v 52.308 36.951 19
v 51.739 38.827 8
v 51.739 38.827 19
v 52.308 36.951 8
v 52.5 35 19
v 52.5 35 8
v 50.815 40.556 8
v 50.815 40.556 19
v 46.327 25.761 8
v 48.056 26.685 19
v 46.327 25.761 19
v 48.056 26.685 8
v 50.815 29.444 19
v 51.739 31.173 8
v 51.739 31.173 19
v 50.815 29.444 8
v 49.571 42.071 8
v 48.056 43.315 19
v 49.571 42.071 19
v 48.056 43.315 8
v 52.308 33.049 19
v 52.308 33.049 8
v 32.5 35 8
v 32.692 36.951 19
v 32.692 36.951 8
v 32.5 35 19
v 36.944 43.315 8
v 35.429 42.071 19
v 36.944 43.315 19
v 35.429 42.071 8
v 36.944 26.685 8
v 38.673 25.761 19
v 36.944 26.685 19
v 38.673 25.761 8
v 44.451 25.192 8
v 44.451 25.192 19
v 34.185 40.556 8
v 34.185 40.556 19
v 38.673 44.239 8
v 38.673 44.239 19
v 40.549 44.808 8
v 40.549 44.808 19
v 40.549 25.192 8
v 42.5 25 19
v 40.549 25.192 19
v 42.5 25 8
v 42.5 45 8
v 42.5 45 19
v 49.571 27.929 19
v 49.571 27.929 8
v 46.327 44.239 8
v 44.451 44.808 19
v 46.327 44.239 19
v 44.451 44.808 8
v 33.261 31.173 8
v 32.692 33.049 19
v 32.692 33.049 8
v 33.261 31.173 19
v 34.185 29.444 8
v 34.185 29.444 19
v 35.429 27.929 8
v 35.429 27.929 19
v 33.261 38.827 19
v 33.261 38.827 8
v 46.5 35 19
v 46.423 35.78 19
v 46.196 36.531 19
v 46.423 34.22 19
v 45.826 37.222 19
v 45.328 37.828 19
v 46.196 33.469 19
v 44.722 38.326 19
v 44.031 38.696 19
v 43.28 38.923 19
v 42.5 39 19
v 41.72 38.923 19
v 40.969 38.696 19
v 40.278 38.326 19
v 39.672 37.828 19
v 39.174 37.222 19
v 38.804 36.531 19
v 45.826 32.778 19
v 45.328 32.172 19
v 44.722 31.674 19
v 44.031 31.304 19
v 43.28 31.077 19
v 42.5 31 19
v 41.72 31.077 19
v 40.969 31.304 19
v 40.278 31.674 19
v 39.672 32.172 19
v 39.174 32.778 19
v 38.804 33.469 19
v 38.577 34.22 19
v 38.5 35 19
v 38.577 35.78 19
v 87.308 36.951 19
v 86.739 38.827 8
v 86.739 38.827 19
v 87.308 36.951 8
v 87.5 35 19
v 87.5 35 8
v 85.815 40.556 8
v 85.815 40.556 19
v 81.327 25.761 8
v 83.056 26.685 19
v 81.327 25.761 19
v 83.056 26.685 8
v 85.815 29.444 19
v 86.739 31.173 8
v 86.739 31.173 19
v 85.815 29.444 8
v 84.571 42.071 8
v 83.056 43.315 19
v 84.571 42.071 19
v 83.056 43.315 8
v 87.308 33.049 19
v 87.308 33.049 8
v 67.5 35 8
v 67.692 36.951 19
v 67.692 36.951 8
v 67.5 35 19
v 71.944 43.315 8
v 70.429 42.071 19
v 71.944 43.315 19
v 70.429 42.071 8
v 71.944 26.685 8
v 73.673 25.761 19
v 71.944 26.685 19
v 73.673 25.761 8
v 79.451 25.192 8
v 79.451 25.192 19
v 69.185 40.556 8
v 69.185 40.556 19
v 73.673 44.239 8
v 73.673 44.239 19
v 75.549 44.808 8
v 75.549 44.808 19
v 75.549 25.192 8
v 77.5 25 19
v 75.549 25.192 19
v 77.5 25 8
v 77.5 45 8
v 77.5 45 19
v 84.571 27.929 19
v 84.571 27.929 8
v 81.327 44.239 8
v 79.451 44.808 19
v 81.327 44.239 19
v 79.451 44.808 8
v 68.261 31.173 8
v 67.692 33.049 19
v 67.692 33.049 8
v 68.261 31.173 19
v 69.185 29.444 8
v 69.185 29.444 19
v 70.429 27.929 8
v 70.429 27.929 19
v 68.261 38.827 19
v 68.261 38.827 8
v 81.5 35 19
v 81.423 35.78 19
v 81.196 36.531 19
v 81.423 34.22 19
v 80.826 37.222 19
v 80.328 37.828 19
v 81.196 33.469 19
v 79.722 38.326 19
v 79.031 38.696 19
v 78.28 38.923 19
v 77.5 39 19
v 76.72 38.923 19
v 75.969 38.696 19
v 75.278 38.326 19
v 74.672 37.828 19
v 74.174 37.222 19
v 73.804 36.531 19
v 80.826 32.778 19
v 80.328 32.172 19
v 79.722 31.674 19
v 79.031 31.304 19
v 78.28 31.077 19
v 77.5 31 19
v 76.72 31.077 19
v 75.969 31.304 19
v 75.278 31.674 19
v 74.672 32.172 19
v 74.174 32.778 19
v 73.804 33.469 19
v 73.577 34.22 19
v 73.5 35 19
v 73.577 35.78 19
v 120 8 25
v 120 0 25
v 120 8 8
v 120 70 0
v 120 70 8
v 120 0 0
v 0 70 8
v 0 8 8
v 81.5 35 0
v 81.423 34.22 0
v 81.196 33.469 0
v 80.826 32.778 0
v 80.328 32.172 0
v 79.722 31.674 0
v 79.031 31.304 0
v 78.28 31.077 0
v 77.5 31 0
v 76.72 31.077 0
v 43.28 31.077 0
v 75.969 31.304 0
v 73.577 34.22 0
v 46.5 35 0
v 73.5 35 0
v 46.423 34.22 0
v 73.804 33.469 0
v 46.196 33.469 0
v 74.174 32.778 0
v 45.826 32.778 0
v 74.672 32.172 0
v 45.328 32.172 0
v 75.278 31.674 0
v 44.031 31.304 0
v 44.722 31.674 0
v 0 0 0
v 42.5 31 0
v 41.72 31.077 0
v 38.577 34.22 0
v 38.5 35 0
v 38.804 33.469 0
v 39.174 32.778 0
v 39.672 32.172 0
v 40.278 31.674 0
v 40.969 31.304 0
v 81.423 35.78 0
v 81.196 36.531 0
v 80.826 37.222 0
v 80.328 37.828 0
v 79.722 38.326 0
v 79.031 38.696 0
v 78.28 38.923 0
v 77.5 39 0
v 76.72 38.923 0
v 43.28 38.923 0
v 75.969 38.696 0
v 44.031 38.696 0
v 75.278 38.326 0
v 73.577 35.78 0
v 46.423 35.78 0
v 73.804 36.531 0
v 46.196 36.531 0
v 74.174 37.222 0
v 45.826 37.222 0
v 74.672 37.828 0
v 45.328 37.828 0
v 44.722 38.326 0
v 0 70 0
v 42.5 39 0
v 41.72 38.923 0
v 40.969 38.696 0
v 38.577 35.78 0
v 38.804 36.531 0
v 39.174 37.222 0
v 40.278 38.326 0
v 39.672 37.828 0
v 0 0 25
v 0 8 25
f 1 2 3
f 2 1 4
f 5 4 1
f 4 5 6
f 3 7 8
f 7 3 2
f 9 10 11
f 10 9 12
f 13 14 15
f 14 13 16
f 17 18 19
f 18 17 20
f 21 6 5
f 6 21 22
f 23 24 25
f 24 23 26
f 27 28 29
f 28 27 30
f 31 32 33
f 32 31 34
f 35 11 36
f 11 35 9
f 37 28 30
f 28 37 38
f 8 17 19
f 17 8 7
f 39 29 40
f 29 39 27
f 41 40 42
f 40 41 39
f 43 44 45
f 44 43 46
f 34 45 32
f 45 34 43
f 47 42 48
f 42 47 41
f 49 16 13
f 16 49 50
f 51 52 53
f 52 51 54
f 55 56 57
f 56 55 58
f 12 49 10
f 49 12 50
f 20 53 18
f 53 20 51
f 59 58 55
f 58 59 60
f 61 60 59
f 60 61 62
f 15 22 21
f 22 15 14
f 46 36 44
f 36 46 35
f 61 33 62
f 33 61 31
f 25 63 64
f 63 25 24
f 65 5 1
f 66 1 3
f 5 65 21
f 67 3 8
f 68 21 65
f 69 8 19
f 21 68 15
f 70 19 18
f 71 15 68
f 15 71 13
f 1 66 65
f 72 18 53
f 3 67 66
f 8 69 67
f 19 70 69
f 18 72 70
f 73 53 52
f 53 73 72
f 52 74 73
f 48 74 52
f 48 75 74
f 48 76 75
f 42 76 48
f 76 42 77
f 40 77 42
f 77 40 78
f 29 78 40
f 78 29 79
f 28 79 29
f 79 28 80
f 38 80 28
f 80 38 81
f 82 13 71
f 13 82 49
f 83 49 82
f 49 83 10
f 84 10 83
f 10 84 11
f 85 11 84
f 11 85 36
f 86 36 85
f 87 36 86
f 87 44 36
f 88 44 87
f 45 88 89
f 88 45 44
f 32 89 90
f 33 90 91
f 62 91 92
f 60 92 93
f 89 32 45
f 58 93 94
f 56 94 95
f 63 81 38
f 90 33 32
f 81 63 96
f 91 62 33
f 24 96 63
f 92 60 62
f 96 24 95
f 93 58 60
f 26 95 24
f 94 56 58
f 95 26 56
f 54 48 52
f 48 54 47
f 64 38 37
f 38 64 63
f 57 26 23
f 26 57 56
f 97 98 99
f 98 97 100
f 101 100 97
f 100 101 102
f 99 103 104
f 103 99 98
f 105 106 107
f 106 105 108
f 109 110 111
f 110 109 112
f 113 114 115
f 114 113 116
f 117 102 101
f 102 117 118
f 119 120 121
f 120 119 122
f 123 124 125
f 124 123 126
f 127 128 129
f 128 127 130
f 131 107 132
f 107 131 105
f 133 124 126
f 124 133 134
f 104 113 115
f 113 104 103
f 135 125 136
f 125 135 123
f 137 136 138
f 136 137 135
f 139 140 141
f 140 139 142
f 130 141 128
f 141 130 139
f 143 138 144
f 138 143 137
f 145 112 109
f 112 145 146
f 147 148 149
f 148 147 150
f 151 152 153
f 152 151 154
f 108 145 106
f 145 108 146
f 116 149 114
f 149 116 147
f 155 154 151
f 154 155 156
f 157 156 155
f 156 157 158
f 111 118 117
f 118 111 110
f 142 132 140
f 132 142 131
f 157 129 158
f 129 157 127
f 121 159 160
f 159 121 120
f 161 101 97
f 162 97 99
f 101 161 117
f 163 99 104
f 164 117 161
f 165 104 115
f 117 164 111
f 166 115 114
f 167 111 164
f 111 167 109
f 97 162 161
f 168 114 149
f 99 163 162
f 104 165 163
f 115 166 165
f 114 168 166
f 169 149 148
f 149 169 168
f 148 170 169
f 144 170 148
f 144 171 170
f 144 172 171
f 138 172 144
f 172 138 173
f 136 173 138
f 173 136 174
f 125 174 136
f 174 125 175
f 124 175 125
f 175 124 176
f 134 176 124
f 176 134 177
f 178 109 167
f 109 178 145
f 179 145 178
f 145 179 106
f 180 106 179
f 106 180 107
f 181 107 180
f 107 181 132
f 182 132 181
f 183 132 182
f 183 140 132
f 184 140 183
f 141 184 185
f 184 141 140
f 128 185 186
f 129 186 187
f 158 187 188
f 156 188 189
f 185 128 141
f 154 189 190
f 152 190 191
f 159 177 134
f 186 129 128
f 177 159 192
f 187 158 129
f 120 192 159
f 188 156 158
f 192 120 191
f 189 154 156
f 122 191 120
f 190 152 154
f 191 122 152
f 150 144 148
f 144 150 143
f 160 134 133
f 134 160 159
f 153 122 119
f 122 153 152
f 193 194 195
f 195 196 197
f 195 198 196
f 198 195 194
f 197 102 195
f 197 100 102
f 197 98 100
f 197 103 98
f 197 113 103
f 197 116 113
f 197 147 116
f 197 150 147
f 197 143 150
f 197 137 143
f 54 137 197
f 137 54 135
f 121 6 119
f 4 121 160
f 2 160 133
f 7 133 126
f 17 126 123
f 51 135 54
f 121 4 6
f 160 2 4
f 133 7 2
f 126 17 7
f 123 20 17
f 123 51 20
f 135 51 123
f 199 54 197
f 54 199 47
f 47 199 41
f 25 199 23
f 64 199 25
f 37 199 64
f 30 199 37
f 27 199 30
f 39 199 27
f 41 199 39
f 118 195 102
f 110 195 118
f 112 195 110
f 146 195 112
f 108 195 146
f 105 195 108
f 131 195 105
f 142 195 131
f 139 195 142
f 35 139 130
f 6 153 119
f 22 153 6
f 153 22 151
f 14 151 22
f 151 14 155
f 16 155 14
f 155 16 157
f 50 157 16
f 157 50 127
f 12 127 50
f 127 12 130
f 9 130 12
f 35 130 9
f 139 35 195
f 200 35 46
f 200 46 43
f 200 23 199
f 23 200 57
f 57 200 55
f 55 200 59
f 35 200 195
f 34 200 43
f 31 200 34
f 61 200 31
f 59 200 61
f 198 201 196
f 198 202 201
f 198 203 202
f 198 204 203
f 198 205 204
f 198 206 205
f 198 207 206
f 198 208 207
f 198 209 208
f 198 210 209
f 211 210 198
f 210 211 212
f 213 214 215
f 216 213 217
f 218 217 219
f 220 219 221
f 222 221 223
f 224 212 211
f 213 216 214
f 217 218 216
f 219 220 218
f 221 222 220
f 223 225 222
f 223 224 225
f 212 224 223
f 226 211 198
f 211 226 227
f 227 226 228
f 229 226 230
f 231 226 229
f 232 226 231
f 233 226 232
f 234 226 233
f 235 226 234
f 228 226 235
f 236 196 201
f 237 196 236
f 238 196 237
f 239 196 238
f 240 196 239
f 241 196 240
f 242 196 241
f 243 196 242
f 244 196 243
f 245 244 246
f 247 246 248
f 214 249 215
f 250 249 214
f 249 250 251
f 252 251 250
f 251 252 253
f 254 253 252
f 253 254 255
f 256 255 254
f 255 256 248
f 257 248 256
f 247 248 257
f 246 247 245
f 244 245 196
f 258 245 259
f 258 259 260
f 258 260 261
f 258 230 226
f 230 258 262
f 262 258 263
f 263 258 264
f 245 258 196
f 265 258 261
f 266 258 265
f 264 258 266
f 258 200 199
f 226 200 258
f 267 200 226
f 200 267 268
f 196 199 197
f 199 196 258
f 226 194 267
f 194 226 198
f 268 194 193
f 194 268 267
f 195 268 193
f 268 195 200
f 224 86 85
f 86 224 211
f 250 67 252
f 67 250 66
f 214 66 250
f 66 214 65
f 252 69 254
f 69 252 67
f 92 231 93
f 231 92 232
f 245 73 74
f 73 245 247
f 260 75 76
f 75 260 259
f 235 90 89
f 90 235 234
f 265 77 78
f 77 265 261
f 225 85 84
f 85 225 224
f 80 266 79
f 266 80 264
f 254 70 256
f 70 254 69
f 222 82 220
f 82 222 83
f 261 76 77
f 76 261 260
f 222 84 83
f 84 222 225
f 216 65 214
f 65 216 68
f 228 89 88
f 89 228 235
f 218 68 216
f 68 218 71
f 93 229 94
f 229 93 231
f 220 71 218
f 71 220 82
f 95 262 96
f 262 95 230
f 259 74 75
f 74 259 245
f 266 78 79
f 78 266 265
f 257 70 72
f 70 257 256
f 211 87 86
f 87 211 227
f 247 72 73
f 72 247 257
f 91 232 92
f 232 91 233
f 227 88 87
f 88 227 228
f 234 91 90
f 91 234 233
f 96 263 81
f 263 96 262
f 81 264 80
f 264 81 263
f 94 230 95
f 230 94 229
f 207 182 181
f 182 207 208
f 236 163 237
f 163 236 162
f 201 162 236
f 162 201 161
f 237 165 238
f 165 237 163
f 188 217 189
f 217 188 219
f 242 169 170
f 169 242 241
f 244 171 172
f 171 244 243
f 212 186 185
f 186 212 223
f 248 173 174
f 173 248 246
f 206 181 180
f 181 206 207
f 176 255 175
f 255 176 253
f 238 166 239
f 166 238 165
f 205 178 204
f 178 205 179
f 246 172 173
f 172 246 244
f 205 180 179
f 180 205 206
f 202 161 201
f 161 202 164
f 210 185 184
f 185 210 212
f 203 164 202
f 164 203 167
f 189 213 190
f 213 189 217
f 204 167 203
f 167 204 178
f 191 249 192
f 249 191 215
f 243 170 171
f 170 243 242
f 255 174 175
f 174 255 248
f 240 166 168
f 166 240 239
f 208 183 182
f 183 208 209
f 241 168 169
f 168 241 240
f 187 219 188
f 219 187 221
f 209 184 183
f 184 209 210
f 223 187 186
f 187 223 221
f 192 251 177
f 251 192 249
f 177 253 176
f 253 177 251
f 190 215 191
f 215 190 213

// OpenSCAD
$fn = 32;

// ----------------------------------------------------------------------
// Drill jig: fence jig
// ----------------------------------------------------------------------

// --- parameters (mm) ---
plate_l = 120;            // plate length, X
plate_w = 70;             // plate width, Y
plate_t = 8;              // plate thickness
boss_d = 20;              // guide boss diameter
boss_h = 12;              // boss height above the plate
guide_d = 8;              // guide hole diameter
boss_pitch = 35;          // boss pitch
fence_h = 18;             // fence height above the plate
fence_t = 8;              // fence thickness

n_boss = 2;  // guide bosses
boss_x0 = (plate_l - (n_boss - 1) * boss_pitch) / 2;  // first boss X
boss_top = plate_t - 1 + boss_h;  // boss crown height
fence_top = plate_t - 1 + fence_h;  // fence crown height
total_h = max([fence_top, boss_top]);  // overall height

difference() {
  union() {
  cube([plate_l, plate_w, plate_t]);
  for (i = [0 : n_boss - 1])
    translate([boss_x0 + i * boss_pitch, plate_w / 2, plate_t - 1])
      cylinder(h = boss_h, d = boss_d);
  translate([0, 0, plate_t - 1]) cube([plate_l, fence_t, fence_h]);
  }
  for (i = [0 : n_boss - 1])
    translate([boss_x0 + i * boss_pitch, plate_w / 2, -1])
      cylinder(h = plate_t + boss_h, d = guide_d);
}
